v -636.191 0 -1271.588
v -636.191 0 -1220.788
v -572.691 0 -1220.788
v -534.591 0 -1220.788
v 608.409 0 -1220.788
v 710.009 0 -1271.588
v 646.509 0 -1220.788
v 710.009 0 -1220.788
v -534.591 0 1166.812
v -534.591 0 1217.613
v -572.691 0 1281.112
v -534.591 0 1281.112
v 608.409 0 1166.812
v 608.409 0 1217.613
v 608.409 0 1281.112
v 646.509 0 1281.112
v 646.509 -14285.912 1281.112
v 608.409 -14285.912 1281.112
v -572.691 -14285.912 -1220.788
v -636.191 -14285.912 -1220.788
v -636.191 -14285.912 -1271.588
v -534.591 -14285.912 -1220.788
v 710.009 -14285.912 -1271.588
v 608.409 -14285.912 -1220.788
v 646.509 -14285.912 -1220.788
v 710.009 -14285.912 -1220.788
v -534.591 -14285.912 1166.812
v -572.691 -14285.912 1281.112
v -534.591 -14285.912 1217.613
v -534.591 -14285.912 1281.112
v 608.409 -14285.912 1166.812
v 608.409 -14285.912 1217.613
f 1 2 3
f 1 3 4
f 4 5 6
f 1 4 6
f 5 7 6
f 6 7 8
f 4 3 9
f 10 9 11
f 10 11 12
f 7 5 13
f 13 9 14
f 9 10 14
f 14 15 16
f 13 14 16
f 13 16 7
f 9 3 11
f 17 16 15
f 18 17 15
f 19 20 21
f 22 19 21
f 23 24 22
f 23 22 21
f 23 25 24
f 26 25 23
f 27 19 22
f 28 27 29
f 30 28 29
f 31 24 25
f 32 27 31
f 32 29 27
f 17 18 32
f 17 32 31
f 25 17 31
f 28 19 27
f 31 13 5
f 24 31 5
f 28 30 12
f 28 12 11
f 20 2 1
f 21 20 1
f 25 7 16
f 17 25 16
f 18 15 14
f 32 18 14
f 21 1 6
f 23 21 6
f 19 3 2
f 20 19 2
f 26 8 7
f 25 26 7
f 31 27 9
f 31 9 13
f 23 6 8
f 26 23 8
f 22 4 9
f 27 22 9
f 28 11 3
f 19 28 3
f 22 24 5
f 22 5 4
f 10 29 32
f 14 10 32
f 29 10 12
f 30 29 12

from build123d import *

# Parameters (mm, degrees)
F0_W     = 1143
F0_H     = 50.8
F1_DEPTH = 14285.9125


# Not quite as in the source:
# - a feature of the source that left no trace in its solid (it failed there, or was rolled back) is left out


with BuildPart() as f1:
    # F0 (on Front) → F1 (new body)
    with BuildSketch(Plane.XZ):
        Polygon((-636.190625, -1271.5875), (710.009375, -1271.5875), (710.009375, -1220.7875), (646.509375, -1220.7875), (608.409375, -1220.7875), (-534.590625, -1220.7875), (-572.690625, -1220.7875), (-636.190625, -1220.7875), align=None)
        Polygon((608.409375, -1220.7875), (646.509375, -1220.7875), (646.509375, 1281.1125), (608.409375, 1281.1125), (608.409375, 1217.6125), (608.409375, 1166.8125), align=None)
        Polygon((-572.690625, 1281.1125), (-572.690625, -1220.7875), (-534.590625, -1220.7875), (-534.590625, 1166.8125), (-534.590625, 1217.6125), (-534.590625, 1281.1125), align=None)
        with Locations((36.909375, 1192.2125)):
            Rectangle(F0_W, F0_H)
    extrude(amount=F1_DEPTH)


solid = f1.part
